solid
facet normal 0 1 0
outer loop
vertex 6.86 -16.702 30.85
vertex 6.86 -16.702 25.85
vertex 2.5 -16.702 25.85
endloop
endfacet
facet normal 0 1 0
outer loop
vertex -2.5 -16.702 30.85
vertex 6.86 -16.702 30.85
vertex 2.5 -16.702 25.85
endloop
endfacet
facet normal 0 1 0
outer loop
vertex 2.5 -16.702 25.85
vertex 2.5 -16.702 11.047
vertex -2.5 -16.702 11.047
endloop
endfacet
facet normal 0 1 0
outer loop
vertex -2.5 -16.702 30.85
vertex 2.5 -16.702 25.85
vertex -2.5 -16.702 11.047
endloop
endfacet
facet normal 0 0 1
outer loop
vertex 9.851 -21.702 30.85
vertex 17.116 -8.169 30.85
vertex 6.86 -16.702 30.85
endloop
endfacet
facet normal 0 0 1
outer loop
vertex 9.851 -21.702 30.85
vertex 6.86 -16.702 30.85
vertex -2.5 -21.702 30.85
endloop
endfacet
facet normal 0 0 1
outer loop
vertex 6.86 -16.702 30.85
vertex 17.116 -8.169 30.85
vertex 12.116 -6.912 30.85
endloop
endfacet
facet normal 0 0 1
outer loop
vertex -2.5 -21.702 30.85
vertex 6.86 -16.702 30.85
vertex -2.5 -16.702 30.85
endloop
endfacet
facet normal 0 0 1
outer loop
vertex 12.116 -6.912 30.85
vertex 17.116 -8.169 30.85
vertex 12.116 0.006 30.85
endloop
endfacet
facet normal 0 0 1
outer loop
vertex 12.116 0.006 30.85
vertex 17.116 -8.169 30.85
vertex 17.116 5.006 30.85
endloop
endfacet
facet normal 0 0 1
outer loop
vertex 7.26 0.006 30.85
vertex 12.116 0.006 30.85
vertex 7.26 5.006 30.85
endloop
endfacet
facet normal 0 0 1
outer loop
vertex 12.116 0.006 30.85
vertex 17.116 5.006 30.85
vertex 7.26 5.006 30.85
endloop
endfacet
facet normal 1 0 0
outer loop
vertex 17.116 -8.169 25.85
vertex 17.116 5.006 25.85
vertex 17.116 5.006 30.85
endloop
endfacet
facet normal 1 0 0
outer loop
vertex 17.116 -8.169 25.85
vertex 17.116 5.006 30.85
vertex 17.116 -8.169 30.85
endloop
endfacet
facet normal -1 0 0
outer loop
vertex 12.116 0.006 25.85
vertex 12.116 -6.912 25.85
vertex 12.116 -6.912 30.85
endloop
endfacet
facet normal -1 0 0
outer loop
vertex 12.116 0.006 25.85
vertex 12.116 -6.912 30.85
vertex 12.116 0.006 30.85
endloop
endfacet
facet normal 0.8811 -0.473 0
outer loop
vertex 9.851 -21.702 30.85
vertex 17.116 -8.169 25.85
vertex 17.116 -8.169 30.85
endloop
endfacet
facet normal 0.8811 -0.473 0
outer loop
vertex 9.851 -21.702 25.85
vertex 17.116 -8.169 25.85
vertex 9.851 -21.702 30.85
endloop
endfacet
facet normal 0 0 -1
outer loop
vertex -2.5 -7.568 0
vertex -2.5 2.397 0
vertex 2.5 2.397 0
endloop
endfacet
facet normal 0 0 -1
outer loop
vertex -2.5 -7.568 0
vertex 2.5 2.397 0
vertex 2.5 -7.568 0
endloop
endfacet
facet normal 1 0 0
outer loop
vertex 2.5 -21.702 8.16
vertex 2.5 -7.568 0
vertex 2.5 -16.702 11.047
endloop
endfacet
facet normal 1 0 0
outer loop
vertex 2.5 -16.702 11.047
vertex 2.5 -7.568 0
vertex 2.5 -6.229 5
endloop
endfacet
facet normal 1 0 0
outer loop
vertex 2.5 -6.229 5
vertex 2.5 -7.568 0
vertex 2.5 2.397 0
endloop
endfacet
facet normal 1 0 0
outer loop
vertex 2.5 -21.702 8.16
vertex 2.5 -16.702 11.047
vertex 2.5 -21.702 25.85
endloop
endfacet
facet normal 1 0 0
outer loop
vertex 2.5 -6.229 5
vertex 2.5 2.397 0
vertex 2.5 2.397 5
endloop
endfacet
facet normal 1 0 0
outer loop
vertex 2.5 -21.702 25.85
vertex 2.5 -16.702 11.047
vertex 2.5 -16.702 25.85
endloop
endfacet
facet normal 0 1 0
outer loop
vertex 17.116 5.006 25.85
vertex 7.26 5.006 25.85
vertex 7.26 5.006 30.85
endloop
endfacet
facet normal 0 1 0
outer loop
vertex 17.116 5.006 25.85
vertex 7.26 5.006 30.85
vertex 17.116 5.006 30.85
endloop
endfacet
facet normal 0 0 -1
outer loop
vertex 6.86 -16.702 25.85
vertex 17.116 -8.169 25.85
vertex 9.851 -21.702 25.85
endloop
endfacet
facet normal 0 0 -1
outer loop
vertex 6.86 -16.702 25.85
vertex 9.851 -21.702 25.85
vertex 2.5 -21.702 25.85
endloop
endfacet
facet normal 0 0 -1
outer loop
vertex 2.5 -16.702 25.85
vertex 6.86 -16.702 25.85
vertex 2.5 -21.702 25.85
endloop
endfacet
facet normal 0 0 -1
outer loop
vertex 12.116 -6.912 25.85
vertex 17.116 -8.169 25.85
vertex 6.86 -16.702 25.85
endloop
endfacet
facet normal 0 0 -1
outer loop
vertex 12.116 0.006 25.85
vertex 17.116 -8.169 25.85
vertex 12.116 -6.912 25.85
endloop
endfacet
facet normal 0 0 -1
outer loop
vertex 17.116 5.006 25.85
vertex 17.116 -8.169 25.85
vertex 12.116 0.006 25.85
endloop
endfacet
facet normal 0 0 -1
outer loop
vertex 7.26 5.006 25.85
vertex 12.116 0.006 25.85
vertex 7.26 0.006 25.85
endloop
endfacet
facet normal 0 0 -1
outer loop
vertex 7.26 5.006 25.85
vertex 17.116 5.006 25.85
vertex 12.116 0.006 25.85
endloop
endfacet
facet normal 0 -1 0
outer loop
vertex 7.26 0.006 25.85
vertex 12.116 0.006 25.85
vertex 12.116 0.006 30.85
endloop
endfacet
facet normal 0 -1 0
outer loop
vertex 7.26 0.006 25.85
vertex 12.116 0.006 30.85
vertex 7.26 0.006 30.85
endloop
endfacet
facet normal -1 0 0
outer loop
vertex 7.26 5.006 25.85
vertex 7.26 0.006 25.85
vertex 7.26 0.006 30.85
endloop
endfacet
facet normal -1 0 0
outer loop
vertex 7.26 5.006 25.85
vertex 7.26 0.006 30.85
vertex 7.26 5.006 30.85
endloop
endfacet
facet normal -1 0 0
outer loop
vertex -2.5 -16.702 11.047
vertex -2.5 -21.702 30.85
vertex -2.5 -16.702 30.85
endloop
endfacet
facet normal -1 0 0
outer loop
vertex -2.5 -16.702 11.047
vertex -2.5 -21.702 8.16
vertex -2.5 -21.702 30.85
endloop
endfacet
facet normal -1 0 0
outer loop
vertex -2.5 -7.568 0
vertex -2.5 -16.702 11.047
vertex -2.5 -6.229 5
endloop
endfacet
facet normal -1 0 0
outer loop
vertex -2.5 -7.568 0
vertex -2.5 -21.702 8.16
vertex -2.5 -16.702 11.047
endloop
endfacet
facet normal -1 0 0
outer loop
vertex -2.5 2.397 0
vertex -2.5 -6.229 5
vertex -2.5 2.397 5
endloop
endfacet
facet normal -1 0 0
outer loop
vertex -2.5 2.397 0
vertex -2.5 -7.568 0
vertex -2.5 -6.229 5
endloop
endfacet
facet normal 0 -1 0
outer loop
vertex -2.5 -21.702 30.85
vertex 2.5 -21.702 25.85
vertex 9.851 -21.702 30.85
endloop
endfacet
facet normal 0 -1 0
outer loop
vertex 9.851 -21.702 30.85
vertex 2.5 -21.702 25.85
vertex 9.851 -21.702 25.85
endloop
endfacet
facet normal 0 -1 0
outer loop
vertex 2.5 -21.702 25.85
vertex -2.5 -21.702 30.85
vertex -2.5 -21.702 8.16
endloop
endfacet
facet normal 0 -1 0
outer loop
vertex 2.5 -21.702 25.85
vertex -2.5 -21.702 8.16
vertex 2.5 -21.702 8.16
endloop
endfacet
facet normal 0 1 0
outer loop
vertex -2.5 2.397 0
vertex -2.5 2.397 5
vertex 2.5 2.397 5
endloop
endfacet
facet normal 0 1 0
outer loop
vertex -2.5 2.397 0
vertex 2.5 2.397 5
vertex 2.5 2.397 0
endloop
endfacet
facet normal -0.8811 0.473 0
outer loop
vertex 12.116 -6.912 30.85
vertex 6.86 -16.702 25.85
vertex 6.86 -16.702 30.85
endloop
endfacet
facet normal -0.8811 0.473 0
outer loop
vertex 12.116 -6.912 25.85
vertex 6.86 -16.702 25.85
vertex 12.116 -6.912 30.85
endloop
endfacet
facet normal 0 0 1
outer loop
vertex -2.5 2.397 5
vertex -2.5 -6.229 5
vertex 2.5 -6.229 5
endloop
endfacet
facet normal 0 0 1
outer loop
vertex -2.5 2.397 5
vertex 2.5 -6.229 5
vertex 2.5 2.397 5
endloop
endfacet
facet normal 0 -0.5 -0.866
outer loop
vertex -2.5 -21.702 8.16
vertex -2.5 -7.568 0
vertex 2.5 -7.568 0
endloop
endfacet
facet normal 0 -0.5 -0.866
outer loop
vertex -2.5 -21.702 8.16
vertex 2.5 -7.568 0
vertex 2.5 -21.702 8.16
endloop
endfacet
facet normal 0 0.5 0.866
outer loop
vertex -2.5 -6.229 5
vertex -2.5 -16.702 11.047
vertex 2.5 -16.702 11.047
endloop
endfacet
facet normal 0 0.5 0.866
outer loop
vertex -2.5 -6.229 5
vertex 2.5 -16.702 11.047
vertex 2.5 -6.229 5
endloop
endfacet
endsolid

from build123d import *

# Parameters (mm, degrees)
BOSS_EXTRUDE1_DEPTH      = 2.5
BOSS_EXTRUDE1_DEPTH_BACK = 2.5
BOSS_EXTRUDE2_DEPTH      = 5


with BuildPart() as part:
    # Sketch1 → Boss-Extrude1 (new, two sides: drawn at the far end of the back side and taken through both)
    with BuildSketch(Plane(origin=(0, 0, 0), x_dir=(0, 0, -1), z_dir=(1, 0, 0)).offset(-BOSS_EXTRUDE1_DEPTH_BACK)):
        Polygon((-5, 2.397355183), (0, 2.397355183), (0, -7.568357101), (-8.160177325, -21.702198826), (-25.849658622, -21.702198826), (-25.849658622, -16.702198826), (-11.046928671, -16.702198826), (-5, -6.228611139), align=None)
    extrude(amount=BOSS_EXTRUDE1_DEPTH + BOSS_EXTRUDE1_DEPTH_BACK)

    # Sketch2 → Boss-Extrude2 (add)
    with BuildSketch(Plane.XY.offset(25.849658622)):
        Polygon((5, -16.702198826), (6.860371394, -16.702198826), (12.116424273, -6.911667965), (12.116424273, 0.006104054), (7.259579322, 0.006104054), (7.259579322, 5.006104054), (17.116424273, 5.006104054), (17.116424273, -8.168933695), (9.851082059, -21.702198826), (5, -21.702198826), (-2.5, -21.702198826), (-2.5, -16.702198826), align=None)
    extrude(amount=BOSS_EXTRUDE2_DEPTH)


solid = part.part
